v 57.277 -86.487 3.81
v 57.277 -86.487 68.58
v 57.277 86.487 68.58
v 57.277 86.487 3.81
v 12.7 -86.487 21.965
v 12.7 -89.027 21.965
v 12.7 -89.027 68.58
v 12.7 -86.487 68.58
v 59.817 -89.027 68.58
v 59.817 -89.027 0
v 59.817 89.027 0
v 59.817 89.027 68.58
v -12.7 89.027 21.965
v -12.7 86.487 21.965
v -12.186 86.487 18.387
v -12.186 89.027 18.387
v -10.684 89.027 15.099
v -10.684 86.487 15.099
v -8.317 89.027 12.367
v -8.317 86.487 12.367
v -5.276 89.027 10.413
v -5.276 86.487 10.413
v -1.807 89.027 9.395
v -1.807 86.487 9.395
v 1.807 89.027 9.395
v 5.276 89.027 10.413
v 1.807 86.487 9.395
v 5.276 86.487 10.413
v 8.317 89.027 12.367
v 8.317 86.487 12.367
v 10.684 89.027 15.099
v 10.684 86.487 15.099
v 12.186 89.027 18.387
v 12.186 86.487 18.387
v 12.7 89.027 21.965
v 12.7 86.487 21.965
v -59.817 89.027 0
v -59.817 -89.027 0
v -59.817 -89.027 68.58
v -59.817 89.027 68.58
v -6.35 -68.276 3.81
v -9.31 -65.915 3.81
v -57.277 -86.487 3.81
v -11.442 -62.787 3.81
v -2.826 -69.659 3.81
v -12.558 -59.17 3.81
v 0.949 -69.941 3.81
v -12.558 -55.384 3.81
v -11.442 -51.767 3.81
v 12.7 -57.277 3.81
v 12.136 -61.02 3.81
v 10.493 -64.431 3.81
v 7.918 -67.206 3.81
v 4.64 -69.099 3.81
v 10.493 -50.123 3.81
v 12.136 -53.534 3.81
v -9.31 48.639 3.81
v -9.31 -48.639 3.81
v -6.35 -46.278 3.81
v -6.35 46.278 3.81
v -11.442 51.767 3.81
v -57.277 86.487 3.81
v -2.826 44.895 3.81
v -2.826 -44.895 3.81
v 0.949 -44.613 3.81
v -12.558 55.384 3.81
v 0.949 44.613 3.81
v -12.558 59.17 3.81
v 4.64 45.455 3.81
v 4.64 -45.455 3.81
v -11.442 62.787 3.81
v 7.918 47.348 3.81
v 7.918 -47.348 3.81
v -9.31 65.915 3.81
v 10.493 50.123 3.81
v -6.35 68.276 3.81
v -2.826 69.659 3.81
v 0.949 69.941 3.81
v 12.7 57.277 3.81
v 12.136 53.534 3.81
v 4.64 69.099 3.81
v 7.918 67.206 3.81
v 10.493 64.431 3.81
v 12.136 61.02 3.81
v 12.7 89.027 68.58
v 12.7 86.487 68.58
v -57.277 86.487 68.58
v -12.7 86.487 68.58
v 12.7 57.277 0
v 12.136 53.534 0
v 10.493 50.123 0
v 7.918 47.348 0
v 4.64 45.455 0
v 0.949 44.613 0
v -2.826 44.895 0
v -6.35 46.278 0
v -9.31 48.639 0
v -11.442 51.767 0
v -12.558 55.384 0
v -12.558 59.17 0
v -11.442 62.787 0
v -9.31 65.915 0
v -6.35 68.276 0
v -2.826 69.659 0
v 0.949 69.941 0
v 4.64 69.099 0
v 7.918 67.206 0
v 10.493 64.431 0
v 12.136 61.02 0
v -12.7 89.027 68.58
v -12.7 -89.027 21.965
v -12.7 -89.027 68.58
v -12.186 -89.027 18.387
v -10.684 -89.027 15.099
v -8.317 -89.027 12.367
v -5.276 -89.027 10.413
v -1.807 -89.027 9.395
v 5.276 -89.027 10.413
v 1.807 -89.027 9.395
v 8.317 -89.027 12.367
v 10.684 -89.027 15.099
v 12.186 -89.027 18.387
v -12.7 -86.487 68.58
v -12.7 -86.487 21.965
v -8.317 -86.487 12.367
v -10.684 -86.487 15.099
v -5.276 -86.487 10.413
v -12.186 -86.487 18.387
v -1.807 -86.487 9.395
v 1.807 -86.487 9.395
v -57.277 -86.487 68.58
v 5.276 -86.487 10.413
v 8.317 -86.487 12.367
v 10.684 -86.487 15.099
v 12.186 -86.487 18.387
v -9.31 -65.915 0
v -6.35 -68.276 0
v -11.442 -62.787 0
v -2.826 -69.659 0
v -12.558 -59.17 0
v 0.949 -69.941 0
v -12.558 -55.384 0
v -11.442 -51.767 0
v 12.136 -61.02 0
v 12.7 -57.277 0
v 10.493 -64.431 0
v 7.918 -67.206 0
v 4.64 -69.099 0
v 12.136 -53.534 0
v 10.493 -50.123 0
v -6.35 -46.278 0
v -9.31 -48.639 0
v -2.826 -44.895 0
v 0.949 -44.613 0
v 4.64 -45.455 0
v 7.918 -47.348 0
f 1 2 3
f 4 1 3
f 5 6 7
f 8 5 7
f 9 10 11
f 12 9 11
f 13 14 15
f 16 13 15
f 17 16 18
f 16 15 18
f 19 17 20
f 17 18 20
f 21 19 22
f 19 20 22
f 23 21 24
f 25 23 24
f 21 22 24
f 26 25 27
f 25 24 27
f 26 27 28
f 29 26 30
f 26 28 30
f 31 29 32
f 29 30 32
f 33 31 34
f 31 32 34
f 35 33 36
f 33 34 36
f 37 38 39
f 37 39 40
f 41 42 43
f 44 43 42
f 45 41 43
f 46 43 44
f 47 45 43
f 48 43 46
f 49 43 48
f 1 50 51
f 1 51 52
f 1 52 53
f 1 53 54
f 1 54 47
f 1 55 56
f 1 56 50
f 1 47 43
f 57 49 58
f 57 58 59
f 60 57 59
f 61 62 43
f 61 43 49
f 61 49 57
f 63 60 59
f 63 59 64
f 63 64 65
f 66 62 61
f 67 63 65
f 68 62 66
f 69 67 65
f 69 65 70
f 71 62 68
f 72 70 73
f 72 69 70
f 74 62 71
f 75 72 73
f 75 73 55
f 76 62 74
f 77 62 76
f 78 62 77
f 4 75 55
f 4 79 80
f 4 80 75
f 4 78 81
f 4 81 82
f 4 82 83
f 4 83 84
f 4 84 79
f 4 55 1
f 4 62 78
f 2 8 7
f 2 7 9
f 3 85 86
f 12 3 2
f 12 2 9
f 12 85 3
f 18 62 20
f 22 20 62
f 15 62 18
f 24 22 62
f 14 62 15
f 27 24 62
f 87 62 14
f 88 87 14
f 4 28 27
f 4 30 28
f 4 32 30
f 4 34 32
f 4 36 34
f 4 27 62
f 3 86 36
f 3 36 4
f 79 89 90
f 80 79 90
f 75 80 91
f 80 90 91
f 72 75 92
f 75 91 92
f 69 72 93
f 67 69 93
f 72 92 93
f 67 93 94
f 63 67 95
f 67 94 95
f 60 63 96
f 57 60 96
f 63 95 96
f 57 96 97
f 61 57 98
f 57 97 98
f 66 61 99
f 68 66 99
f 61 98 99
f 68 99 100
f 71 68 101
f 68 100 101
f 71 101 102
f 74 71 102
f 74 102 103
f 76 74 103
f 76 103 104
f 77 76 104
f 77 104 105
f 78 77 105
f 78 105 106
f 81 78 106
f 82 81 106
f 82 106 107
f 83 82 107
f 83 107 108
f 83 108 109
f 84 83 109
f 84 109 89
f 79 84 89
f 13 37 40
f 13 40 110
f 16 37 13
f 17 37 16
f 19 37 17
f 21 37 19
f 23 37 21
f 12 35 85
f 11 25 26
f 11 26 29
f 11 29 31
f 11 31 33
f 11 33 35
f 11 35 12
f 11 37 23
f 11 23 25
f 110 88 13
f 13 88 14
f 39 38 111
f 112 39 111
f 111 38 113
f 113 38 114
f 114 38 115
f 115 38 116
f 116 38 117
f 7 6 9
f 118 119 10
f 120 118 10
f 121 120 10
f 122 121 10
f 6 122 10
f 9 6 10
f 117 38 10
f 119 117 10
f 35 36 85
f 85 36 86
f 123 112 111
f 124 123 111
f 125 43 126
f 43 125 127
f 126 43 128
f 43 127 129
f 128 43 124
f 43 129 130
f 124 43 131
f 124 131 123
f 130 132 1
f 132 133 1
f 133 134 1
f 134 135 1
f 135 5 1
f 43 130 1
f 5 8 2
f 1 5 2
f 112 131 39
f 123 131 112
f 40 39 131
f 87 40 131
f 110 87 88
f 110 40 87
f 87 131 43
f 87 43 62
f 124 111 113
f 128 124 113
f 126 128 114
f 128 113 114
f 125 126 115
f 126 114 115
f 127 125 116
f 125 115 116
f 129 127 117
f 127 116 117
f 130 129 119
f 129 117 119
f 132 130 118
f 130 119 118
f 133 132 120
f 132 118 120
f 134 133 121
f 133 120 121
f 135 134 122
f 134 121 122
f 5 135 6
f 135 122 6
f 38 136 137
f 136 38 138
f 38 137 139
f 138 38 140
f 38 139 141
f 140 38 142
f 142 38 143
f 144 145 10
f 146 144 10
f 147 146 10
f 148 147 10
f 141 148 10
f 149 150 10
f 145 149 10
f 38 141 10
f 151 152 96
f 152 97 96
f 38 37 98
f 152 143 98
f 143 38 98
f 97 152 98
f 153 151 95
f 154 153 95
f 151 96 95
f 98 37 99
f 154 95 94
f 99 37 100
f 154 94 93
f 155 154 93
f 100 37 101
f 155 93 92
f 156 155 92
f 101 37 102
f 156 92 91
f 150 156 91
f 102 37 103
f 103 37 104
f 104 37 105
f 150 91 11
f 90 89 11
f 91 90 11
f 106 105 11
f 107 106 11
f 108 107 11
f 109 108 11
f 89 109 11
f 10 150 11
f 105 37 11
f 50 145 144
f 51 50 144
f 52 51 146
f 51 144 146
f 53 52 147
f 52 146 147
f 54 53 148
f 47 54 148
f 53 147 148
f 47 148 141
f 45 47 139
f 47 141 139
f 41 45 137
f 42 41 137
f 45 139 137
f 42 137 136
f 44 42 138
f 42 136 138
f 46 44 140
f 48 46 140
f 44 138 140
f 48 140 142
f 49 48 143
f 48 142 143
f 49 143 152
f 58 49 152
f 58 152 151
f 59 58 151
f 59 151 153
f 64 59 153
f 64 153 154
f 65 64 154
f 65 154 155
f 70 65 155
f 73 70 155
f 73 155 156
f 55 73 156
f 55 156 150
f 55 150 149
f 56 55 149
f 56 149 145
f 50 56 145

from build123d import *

# Parameters (mm, degrees)
F0_W     = 119.634
F0_H     = 178.054
F1_DEPTH = 68.58
F2_W     = 114.554
F2_H     = 172.974
F3_DEPTH = 64.77
F5_DEPTH = 190.5
F6_R     = 12.7
F7_DEPTH = 5.08


with BuildPart() as f1:
    # F0 (on Top) → F1 (new body)
    with BuildSketch(Plane.XY):
        Rectangle(F0_W, F0_H)
    extrude(amount=F1_DEPTH)

    # F2 (on face) → F3 (cut)
    with BuildSketch(Plane.XY.offset(68.58)):
        Rectangle(F2_W, F2_H)
    extrude(amount=-F3_DEPTH, mode=Mode.SUBTRACT)

    # F4 (on face) → F5 (cut)
    with BuildSketch(Plane.XZ.offset(89.027)):
        with BuildLine():
            ThreePointArc((-12.7, 21.965362), (0, 9.265362), (12.7, 21.965362))
            ThreePointArc((12.7, 21.965362), (0, 34.665362), (-12.7, 21.965362))
        make_face()
        with BuildLine():
            ThreePointArc((-12.7, 21.965362), (0, 34.665362), (12.7, 21.965362))
            Line((12.7, 21.965362), (12.7, 68.58))
            Line((12.7, 68.58), (-12.7, 68.58))
            Line((-12.7, 68.58), (-12.7, 21.965362))
        make_face()
    extrude(amount=-F5_DEPTH, mode=Mode.SUBTRACT)

    # F6 (on face) → F7 (cut)
    with BuildSketch(Plane(origin=(0, 0, 0), x_dir=(1, 0, 0), z_dir=(0, 0, -1))):
        with Locations((0, 57.277)):
            Circle(F6_R)
        with Locations((0, -57.277)):
            Circle(F6_R)
    extrude(amount=-F7_DEPTH, mode=Mode.SUBTRACT)


solid = f1.part
